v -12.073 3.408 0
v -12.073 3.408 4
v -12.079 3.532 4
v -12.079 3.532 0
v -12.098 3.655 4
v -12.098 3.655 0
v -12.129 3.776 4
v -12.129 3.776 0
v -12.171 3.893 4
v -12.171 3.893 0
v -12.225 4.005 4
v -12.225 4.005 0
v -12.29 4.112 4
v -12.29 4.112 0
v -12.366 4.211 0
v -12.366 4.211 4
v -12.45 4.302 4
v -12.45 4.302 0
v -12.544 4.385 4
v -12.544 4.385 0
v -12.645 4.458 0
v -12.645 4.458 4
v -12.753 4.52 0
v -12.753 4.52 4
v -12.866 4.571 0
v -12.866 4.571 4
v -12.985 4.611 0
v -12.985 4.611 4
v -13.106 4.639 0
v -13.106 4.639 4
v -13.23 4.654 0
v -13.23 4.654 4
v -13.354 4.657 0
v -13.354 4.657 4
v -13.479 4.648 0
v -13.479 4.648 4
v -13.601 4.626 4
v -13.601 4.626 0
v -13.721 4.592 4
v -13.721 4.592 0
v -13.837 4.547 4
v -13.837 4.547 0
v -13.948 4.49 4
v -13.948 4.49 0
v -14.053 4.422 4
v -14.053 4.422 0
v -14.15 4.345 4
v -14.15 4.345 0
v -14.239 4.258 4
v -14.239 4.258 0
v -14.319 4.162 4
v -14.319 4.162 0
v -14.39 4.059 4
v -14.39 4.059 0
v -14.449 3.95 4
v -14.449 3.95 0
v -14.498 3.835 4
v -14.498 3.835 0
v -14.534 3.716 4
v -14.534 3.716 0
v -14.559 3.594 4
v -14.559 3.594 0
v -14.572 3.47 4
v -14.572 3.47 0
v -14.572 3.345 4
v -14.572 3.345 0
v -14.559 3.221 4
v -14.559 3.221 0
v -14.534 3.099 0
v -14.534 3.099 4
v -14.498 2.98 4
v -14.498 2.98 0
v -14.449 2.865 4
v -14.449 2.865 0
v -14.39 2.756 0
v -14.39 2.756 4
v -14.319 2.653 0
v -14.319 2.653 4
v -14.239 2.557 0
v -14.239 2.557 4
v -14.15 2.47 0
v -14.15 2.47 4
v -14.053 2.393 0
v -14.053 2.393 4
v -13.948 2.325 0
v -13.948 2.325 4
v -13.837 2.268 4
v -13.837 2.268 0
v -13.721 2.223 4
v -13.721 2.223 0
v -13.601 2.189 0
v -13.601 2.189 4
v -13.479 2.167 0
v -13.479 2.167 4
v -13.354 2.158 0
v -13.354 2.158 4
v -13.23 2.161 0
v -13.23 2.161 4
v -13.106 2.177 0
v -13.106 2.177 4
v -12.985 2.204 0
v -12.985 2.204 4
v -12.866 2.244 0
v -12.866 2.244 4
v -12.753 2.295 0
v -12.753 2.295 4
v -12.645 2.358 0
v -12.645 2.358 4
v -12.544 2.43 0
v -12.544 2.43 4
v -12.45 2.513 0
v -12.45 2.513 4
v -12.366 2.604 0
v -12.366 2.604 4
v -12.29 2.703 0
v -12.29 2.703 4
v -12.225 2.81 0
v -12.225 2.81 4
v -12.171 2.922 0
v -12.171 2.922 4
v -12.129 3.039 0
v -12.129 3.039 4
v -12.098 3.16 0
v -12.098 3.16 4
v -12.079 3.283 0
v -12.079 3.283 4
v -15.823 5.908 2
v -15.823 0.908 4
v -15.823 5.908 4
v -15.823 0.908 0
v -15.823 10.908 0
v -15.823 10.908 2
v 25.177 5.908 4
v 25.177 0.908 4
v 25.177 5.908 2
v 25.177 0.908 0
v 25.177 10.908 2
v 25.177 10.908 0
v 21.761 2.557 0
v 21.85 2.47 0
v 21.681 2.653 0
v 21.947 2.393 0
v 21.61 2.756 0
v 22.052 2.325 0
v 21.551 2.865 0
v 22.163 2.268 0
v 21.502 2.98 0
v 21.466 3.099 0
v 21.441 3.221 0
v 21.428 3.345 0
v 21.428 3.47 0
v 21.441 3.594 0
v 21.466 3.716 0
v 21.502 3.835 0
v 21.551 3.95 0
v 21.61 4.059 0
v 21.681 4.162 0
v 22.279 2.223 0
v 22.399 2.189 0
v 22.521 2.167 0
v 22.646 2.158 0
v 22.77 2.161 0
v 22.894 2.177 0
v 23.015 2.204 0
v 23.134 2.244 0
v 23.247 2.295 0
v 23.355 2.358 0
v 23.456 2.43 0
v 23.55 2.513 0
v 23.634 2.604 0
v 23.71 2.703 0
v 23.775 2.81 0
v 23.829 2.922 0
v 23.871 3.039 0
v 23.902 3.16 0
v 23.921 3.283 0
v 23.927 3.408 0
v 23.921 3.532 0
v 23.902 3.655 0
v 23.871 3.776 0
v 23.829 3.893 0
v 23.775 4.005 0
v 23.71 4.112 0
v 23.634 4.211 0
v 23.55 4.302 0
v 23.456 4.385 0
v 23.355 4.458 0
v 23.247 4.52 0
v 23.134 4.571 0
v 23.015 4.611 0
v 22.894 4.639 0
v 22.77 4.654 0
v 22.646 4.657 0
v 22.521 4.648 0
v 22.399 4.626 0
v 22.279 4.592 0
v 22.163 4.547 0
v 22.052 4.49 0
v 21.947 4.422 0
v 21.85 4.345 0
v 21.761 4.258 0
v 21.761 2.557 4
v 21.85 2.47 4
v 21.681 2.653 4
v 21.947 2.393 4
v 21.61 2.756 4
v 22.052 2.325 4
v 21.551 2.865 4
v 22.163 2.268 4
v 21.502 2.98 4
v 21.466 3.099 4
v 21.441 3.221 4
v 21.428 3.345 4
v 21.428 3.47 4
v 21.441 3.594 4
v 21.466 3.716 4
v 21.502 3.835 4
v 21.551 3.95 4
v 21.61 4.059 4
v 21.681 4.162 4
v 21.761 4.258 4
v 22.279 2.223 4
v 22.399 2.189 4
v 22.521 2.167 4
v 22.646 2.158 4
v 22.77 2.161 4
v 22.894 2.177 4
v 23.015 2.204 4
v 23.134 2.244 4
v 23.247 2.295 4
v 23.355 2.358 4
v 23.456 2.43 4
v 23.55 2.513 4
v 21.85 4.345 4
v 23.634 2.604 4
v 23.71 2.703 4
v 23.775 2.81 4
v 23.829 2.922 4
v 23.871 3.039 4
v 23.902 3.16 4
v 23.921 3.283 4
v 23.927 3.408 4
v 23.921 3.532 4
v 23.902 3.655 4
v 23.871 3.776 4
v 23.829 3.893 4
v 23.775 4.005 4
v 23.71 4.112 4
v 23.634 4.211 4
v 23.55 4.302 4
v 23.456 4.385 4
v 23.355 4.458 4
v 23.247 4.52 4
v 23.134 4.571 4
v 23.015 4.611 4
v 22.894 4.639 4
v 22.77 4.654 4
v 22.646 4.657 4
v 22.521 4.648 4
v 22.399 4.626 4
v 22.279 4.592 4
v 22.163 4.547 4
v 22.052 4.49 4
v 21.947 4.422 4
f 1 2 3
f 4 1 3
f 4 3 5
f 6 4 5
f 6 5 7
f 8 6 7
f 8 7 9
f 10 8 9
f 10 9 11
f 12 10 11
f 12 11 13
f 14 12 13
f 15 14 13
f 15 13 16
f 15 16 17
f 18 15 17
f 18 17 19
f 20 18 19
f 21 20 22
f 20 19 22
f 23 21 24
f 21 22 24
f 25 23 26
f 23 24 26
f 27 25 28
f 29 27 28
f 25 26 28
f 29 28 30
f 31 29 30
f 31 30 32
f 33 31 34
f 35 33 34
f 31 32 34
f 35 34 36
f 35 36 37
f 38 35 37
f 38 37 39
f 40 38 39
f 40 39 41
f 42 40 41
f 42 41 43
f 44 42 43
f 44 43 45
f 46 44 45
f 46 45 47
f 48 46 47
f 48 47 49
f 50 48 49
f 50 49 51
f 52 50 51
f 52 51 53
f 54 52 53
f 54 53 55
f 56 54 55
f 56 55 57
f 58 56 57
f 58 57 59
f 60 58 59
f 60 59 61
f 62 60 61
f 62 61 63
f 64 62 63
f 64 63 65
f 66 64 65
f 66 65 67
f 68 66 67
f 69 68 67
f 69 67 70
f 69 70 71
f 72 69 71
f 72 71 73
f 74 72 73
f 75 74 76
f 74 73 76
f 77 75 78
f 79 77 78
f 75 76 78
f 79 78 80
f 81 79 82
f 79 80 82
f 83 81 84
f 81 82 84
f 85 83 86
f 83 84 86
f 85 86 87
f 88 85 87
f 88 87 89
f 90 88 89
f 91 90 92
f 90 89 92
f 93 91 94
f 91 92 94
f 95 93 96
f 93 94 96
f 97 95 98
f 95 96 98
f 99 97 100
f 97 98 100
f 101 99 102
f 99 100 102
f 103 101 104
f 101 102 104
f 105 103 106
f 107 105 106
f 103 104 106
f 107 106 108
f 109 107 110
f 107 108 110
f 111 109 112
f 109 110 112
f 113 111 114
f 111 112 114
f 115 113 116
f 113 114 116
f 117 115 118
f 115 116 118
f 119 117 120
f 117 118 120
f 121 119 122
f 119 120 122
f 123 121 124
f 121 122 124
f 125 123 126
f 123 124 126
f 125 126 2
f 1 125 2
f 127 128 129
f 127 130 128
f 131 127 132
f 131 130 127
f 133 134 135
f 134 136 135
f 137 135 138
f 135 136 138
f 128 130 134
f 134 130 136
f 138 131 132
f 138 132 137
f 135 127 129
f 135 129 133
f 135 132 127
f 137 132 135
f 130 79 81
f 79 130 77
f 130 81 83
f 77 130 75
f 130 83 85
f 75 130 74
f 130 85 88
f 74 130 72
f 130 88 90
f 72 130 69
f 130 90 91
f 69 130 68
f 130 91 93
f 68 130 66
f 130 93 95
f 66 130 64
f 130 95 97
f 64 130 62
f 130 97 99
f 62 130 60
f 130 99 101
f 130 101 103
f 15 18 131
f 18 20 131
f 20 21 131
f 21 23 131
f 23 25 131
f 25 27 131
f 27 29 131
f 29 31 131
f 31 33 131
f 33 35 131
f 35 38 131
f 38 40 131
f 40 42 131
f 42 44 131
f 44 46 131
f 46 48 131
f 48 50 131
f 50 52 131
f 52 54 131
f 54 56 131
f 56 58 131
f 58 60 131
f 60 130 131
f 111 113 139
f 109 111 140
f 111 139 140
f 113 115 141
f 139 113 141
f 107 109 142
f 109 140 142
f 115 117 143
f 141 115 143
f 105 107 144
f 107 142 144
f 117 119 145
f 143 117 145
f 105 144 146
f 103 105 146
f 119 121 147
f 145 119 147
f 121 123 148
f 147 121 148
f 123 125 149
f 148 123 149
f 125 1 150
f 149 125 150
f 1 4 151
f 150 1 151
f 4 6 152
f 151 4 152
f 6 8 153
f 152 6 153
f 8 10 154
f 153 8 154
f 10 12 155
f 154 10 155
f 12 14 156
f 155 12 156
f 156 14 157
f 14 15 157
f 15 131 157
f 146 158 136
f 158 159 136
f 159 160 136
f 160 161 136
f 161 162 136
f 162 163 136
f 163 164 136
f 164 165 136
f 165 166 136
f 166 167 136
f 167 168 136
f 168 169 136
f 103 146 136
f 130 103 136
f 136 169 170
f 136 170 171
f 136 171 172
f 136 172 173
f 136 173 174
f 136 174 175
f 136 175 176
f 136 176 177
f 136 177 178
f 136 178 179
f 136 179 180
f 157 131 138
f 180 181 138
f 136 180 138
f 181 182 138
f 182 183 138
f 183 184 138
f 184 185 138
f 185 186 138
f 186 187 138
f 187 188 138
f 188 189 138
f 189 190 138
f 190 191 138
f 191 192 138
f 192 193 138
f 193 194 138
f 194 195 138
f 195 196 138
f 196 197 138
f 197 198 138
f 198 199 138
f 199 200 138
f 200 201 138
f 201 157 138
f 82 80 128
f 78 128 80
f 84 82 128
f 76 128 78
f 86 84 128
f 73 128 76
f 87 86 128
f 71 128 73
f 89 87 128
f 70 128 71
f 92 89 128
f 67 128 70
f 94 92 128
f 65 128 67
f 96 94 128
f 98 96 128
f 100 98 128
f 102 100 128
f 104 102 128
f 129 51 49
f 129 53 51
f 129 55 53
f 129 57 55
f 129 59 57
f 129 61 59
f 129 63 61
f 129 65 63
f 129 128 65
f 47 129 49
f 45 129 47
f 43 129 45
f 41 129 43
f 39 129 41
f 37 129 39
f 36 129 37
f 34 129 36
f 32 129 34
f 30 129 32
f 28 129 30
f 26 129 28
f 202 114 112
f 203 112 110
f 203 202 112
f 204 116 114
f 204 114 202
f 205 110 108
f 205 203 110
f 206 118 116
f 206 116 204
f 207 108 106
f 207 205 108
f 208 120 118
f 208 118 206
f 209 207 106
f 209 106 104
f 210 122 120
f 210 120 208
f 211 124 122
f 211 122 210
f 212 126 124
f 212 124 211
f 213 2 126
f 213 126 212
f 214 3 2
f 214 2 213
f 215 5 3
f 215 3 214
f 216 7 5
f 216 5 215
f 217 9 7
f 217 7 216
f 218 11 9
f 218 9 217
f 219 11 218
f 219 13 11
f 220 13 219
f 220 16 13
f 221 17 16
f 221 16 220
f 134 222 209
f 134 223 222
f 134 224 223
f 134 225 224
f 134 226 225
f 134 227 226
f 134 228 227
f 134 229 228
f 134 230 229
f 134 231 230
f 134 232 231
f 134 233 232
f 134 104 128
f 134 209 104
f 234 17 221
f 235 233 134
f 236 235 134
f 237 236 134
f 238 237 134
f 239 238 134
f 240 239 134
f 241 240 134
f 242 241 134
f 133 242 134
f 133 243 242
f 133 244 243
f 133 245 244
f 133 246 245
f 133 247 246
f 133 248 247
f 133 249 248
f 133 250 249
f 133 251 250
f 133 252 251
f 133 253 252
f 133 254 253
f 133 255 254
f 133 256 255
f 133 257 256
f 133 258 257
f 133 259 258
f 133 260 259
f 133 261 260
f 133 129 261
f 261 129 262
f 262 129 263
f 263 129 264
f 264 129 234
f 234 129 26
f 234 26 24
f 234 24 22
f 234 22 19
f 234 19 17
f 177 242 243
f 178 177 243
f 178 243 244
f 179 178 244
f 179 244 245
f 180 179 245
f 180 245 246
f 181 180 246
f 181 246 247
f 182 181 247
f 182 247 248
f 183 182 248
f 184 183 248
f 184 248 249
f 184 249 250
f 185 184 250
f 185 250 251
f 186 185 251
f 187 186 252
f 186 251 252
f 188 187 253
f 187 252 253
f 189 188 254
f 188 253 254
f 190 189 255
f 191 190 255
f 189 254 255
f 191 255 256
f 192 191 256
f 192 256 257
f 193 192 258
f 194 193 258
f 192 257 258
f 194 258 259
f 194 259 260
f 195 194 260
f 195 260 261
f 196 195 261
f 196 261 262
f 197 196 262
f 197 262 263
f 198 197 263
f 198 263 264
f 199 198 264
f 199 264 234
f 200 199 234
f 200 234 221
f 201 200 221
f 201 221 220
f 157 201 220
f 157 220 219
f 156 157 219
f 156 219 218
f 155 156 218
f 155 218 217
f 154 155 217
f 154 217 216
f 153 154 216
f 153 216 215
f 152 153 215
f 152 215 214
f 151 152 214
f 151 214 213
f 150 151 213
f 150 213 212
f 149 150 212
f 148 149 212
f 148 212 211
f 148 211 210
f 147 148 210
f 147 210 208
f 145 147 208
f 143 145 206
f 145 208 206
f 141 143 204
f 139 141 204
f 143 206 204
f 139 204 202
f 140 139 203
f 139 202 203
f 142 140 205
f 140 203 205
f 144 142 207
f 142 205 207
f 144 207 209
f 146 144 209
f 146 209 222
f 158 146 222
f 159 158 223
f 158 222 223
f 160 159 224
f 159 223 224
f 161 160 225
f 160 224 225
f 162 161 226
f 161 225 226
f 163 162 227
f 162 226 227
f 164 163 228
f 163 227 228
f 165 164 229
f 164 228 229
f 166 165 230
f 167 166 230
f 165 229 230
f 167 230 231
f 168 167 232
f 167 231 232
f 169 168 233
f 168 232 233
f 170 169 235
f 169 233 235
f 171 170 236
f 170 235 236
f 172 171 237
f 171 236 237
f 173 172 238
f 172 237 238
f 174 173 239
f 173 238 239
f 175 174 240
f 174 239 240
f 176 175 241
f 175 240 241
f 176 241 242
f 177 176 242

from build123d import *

# Parameters (mm, degrees)
SKETCH_1_W          = 41
SKETCH_1_H          = 10
EXTRUDE_1_DEPTH     = 2
SKETCH_2_W          = 41
SKETCH_2_H          = 5
EXTRUDE_2_DEPTH     = 2
SKETCH_3_R          = 1.25
CUT_EXTRUDE_1_DEPTH = 28.728178021


with BuildPart() as part:
    # 草圖1 → 填料-伸長1 (new body)
    with BuildSketch(Plane.XY):
        with Locations((4.676919413, 5.90754717)):
            Rectangle(SKETCH_1_W, SKETCH_1_H)
    extrude(amount=EXTRUDE_1_DEPTH)

    # 草圖2 → 填料-伸長2 (add)
    with BuildSketch(Plane.XY.offset(2)):
        with Locations((4.676919413, 3.40754717)):
            Rectangle(SKETCH_2_W, SKETCH_2_H)
    extrude(amount=EXTRUDE_2_DEPTH)

    # 草圖3 → 除料-伸長1 (cut, through all)
    with BuildSketch(Plane.XY.offset(4)):
        with Locations((-13.323080587, 3.40754717)):
            Circle(SKETCH_3_R)
        with Locations((22.676919413, 3.40754717)):
            Circle(SKETCH_3_R)
    extrude(amount=-CUT_EXTRUDE_1_DEPTH, mode=Mode.SUBTRACT)


solid = part.part
